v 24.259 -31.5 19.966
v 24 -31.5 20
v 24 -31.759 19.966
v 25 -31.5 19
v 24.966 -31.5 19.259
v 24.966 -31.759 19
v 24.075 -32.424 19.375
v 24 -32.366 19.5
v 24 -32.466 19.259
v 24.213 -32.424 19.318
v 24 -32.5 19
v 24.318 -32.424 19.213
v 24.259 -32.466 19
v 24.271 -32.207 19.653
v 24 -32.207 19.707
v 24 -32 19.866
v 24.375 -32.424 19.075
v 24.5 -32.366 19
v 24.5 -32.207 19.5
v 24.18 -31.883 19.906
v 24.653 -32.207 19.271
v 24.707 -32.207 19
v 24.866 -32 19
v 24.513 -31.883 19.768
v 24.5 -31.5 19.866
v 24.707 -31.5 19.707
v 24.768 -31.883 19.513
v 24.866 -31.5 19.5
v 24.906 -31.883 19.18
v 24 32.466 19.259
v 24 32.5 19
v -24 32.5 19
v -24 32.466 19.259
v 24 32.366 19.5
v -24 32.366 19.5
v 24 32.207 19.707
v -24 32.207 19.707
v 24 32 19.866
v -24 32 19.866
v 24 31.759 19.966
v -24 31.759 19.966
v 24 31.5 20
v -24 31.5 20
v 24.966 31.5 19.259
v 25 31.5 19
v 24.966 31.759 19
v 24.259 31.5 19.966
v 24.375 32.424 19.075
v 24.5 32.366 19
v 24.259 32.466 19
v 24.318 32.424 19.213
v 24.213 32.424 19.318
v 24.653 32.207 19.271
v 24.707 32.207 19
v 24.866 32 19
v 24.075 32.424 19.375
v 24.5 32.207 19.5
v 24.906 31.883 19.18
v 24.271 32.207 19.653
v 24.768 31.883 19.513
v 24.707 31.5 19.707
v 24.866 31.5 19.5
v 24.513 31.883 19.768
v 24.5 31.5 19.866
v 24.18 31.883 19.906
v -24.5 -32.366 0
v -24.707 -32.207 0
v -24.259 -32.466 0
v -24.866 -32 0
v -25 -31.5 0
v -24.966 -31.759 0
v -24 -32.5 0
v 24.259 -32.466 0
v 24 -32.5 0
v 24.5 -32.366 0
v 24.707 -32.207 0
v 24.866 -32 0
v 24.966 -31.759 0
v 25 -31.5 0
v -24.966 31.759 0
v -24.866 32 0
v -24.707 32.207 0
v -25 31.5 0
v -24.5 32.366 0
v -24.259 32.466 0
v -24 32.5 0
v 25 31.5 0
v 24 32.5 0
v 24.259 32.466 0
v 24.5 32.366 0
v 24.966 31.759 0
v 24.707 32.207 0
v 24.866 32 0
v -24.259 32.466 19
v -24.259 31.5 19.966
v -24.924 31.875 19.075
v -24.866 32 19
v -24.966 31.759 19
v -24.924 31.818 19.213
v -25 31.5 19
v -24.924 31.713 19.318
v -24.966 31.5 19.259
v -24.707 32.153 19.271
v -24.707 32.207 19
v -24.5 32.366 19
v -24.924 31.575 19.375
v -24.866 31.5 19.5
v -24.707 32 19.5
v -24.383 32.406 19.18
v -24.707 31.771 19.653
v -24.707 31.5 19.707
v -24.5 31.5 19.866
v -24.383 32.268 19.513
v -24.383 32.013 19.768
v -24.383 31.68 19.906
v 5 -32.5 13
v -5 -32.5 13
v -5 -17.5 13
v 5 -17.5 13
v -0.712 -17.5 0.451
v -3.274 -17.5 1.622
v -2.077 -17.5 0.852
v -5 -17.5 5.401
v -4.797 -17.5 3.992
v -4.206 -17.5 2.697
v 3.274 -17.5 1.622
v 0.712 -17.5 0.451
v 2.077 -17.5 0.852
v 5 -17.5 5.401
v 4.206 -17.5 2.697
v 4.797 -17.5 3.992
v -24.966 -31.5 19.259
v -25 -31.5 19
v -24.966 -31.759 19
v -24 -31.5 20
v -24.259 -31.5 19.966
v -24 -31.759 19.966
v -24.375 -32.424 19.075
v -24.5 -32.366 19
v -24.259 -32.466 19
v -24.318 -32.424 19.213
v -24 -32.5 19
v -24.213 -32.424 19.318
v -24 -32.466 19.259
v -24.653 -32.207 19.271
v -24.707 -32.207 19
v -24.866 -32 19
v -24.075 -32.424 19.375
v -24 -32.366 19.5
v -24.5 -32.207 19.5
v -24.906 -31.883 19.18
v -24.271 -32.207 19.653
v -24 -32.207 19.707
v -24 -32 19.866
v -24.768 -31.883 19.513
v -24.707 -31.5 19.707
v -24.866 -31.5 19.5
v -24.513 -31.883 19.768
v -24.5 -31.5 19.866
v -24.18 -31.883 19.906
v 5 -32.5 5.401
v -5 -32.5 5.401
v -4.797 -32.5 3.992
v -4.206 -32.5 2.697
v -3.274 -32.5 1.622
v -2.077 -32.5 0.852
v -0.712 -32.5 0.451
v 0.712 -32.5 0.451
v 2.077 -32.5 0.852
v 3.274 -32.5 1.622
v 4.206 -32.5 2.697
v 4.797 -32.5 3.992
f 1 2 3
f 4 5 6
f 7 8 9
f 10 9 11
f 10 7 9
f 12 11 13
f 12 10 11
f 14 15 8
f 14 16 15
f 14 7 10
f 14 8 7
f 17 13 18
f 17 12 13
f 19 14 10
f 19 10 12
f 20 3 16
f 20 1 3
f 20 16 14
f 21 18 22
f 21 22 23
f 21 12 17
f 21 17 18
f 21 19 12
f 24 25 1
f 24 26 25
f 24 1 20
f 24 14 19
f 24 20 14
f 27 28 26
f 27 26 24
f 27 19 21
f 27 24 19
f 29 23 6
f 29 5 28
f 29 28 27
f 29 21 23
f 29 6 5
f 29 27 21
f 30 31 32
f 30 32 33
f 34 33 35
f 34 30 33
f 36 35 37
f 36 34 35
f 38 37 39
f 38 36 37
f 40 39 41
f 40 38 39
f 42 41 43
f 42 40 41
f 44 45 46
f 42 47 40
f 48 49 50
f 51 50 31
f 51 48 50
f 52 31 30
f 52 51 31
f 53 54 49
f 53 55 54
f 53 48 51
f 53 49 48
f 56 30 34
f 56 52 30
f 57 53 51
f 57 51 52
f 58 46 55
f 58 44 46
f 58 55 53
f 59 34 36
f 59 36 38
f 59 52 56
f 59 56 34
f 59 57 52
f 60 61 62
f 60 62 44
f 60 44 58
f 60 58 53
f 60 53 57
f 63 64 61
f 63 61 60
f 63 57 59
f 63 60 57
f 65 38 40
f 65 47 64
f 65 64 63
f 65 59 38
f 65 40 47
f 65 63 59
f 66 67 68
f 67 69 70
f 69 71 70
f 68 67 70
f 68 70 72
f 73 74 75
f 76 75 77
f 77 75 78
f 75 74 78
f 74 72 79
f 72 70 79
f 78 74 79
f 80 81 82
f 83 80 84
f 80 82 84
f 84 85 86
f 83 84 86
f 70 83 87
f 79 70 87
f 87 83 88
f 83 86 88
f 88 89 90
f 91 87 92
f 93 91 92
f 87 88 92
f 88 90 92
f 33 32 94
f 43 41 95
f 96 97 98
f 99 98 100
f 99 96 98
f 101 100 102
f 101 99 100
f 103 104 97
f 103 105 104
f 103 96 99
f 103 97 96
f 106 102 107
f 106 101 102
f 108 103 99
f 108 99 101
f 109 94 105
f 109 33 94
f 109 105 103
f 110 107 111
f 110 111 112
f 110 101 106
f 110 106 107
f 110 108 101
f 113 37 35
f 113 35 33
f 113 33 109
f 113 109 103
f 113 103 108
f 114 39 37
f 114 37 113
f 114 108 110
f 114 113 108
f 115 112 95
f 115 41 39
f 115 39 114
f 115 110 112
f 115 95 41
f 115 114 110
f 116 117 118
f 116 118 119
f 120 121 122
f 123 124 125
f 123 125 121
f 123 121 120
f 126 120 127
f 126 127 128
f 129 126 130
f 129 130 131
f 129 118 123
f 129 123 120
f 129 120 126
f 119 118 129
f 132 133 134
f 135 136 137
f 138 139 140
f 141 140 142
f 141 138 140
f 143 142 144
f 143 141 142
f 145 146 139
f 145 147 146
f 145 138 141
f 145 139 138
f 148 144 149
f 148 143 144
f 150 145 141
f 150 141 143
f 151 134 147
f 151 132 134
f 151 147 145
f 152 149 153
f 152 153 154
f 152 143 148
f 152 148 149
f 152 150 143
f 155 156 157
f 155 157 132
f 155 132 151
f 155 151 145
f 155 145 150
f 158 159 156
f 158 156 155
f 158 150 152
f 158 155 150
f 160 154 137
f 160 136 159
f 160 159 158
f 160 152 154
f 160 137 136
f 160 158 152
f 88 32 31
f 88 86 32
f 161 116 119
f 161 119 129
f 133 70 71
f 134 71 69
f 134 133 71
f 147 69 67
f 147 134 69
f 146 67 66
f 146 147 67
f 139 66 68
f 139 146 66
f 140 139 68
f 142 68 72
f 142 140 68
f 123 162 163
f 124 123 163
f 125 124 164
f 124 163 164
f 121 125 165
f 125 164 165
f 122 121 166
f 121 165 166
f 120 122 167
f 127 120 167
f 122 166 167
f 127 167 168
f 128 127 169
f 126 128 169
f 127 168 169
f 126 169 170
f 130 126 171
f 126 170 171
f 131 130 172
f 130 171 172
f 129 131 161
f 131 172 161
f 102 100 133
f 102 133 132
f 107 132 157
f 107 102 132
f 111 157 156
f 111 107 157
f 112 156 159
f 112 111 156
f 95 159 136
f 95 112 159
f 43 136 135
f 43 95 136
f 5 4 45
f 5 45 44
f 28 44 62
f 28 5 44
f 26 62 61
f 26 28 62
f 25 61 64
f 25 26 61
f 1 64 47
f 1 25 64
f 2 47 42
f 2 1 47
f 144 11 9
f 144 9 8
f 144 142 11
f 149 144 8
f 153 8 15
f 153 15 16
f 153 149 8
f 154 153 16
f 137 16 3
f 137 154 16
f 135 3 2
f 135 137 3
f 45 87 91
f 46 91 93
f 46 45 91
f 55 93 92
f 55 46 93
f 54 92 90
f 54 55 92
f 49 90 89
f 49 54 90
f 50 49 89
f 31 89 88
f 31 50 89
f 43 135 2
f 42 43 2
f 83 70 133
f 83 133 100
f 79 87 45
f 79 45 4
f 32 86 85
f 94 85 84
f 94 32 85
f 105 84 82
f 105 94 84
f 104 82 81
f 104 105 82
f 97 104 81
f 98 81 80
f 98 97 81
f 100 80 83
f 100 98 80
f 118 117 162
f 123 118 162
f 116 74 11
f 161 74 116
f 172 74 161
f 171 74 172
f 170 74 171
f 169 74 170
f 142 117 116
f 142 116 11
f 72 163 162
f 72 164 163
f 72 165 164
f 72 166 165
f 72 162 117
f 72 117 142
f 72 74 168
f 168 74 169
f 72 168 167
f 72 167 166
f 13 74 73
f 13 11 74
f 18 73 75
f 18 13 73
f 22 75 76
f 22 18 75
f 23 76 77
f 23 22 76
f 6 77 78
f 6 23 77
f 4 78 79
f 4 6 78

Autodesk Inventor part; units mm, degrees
ref_plane "YZ Plane" through (0, 0, 0) normal (1, 0, 0) x (0, 1, 0)
ref_plane "XZ Plane" through (0, 0, 0) normal (0, 1, 0) x (-1, 0, 0)
ref_plane "XY Plane" through (0, 0, 0) normal (0, 0, 1) x (1, 0, 0)
sketch "Boceto1" plane through (0, 0, 0) normal (0, 0, 1) x (1, 0, 0)
  line L0 (25, -32.5) -> (-25, -32.5)
  line L1 (-25, -32.5) -> (-25, 32.5)
  line L2 (-25, 32.5) -> (25, 32.5)
  line L3 (25, 32.5) -> (25, -32.5)
  line L4 (25, -32.5) -> (-25, 32.5) construction
  line L5 (-25, -32.5) -> (25, 32.5) construction
  point P0 (0, 0)
  dimension "d0" = 50
  dimension "d1" = 65
extrude "Extrusión1" add sketch "Boceto1" along normal blind 20
sketch "Boceto2" plane through (-25, -32.5, 0) normal (0, -1, 0) x (1, 0, 0)
  line L0 (0, 0) -> (0, 20) projected
  line L1 (0, 13) -> (49.9794, 13)
  line L2 (0, 20) -> (50, 20) projected
  line L3 (0, 28.5169) -> (0, -2.5169) construction
  line L4 (20, 13) -> (20, 5.4006)
  line L5 (30, 13) -> (30, 5.4006)
  line L6 (25, 0) -> (25, 28.5169) construction
  arc A0 (20, 5.4006) -> (30, 5.4006) centre (25, 5.4006) ccw
  point P0 (0, 13)
  dimension "d4" = 7
  dimension "d5" = 10
  dimension "d6" = 49.9794
  dimension "d7" = 14.5994
  dimension "d8" = 8.5169
  dimension "d9" = 8.5169
extrude "Extrusión2" cut sketch "Boceto2" against normal blind 15
fillet "Empalme1" radius 1 8 edges at (25, 0, 20) (0, 32.5, 20) (25, 32.5, 10) (-25, 0, 20) (-25, 32.5, 10) (0, -32.5, 20) (-25, -32.5, 10) (25, -32.5, 10)
properties part number "componente"
